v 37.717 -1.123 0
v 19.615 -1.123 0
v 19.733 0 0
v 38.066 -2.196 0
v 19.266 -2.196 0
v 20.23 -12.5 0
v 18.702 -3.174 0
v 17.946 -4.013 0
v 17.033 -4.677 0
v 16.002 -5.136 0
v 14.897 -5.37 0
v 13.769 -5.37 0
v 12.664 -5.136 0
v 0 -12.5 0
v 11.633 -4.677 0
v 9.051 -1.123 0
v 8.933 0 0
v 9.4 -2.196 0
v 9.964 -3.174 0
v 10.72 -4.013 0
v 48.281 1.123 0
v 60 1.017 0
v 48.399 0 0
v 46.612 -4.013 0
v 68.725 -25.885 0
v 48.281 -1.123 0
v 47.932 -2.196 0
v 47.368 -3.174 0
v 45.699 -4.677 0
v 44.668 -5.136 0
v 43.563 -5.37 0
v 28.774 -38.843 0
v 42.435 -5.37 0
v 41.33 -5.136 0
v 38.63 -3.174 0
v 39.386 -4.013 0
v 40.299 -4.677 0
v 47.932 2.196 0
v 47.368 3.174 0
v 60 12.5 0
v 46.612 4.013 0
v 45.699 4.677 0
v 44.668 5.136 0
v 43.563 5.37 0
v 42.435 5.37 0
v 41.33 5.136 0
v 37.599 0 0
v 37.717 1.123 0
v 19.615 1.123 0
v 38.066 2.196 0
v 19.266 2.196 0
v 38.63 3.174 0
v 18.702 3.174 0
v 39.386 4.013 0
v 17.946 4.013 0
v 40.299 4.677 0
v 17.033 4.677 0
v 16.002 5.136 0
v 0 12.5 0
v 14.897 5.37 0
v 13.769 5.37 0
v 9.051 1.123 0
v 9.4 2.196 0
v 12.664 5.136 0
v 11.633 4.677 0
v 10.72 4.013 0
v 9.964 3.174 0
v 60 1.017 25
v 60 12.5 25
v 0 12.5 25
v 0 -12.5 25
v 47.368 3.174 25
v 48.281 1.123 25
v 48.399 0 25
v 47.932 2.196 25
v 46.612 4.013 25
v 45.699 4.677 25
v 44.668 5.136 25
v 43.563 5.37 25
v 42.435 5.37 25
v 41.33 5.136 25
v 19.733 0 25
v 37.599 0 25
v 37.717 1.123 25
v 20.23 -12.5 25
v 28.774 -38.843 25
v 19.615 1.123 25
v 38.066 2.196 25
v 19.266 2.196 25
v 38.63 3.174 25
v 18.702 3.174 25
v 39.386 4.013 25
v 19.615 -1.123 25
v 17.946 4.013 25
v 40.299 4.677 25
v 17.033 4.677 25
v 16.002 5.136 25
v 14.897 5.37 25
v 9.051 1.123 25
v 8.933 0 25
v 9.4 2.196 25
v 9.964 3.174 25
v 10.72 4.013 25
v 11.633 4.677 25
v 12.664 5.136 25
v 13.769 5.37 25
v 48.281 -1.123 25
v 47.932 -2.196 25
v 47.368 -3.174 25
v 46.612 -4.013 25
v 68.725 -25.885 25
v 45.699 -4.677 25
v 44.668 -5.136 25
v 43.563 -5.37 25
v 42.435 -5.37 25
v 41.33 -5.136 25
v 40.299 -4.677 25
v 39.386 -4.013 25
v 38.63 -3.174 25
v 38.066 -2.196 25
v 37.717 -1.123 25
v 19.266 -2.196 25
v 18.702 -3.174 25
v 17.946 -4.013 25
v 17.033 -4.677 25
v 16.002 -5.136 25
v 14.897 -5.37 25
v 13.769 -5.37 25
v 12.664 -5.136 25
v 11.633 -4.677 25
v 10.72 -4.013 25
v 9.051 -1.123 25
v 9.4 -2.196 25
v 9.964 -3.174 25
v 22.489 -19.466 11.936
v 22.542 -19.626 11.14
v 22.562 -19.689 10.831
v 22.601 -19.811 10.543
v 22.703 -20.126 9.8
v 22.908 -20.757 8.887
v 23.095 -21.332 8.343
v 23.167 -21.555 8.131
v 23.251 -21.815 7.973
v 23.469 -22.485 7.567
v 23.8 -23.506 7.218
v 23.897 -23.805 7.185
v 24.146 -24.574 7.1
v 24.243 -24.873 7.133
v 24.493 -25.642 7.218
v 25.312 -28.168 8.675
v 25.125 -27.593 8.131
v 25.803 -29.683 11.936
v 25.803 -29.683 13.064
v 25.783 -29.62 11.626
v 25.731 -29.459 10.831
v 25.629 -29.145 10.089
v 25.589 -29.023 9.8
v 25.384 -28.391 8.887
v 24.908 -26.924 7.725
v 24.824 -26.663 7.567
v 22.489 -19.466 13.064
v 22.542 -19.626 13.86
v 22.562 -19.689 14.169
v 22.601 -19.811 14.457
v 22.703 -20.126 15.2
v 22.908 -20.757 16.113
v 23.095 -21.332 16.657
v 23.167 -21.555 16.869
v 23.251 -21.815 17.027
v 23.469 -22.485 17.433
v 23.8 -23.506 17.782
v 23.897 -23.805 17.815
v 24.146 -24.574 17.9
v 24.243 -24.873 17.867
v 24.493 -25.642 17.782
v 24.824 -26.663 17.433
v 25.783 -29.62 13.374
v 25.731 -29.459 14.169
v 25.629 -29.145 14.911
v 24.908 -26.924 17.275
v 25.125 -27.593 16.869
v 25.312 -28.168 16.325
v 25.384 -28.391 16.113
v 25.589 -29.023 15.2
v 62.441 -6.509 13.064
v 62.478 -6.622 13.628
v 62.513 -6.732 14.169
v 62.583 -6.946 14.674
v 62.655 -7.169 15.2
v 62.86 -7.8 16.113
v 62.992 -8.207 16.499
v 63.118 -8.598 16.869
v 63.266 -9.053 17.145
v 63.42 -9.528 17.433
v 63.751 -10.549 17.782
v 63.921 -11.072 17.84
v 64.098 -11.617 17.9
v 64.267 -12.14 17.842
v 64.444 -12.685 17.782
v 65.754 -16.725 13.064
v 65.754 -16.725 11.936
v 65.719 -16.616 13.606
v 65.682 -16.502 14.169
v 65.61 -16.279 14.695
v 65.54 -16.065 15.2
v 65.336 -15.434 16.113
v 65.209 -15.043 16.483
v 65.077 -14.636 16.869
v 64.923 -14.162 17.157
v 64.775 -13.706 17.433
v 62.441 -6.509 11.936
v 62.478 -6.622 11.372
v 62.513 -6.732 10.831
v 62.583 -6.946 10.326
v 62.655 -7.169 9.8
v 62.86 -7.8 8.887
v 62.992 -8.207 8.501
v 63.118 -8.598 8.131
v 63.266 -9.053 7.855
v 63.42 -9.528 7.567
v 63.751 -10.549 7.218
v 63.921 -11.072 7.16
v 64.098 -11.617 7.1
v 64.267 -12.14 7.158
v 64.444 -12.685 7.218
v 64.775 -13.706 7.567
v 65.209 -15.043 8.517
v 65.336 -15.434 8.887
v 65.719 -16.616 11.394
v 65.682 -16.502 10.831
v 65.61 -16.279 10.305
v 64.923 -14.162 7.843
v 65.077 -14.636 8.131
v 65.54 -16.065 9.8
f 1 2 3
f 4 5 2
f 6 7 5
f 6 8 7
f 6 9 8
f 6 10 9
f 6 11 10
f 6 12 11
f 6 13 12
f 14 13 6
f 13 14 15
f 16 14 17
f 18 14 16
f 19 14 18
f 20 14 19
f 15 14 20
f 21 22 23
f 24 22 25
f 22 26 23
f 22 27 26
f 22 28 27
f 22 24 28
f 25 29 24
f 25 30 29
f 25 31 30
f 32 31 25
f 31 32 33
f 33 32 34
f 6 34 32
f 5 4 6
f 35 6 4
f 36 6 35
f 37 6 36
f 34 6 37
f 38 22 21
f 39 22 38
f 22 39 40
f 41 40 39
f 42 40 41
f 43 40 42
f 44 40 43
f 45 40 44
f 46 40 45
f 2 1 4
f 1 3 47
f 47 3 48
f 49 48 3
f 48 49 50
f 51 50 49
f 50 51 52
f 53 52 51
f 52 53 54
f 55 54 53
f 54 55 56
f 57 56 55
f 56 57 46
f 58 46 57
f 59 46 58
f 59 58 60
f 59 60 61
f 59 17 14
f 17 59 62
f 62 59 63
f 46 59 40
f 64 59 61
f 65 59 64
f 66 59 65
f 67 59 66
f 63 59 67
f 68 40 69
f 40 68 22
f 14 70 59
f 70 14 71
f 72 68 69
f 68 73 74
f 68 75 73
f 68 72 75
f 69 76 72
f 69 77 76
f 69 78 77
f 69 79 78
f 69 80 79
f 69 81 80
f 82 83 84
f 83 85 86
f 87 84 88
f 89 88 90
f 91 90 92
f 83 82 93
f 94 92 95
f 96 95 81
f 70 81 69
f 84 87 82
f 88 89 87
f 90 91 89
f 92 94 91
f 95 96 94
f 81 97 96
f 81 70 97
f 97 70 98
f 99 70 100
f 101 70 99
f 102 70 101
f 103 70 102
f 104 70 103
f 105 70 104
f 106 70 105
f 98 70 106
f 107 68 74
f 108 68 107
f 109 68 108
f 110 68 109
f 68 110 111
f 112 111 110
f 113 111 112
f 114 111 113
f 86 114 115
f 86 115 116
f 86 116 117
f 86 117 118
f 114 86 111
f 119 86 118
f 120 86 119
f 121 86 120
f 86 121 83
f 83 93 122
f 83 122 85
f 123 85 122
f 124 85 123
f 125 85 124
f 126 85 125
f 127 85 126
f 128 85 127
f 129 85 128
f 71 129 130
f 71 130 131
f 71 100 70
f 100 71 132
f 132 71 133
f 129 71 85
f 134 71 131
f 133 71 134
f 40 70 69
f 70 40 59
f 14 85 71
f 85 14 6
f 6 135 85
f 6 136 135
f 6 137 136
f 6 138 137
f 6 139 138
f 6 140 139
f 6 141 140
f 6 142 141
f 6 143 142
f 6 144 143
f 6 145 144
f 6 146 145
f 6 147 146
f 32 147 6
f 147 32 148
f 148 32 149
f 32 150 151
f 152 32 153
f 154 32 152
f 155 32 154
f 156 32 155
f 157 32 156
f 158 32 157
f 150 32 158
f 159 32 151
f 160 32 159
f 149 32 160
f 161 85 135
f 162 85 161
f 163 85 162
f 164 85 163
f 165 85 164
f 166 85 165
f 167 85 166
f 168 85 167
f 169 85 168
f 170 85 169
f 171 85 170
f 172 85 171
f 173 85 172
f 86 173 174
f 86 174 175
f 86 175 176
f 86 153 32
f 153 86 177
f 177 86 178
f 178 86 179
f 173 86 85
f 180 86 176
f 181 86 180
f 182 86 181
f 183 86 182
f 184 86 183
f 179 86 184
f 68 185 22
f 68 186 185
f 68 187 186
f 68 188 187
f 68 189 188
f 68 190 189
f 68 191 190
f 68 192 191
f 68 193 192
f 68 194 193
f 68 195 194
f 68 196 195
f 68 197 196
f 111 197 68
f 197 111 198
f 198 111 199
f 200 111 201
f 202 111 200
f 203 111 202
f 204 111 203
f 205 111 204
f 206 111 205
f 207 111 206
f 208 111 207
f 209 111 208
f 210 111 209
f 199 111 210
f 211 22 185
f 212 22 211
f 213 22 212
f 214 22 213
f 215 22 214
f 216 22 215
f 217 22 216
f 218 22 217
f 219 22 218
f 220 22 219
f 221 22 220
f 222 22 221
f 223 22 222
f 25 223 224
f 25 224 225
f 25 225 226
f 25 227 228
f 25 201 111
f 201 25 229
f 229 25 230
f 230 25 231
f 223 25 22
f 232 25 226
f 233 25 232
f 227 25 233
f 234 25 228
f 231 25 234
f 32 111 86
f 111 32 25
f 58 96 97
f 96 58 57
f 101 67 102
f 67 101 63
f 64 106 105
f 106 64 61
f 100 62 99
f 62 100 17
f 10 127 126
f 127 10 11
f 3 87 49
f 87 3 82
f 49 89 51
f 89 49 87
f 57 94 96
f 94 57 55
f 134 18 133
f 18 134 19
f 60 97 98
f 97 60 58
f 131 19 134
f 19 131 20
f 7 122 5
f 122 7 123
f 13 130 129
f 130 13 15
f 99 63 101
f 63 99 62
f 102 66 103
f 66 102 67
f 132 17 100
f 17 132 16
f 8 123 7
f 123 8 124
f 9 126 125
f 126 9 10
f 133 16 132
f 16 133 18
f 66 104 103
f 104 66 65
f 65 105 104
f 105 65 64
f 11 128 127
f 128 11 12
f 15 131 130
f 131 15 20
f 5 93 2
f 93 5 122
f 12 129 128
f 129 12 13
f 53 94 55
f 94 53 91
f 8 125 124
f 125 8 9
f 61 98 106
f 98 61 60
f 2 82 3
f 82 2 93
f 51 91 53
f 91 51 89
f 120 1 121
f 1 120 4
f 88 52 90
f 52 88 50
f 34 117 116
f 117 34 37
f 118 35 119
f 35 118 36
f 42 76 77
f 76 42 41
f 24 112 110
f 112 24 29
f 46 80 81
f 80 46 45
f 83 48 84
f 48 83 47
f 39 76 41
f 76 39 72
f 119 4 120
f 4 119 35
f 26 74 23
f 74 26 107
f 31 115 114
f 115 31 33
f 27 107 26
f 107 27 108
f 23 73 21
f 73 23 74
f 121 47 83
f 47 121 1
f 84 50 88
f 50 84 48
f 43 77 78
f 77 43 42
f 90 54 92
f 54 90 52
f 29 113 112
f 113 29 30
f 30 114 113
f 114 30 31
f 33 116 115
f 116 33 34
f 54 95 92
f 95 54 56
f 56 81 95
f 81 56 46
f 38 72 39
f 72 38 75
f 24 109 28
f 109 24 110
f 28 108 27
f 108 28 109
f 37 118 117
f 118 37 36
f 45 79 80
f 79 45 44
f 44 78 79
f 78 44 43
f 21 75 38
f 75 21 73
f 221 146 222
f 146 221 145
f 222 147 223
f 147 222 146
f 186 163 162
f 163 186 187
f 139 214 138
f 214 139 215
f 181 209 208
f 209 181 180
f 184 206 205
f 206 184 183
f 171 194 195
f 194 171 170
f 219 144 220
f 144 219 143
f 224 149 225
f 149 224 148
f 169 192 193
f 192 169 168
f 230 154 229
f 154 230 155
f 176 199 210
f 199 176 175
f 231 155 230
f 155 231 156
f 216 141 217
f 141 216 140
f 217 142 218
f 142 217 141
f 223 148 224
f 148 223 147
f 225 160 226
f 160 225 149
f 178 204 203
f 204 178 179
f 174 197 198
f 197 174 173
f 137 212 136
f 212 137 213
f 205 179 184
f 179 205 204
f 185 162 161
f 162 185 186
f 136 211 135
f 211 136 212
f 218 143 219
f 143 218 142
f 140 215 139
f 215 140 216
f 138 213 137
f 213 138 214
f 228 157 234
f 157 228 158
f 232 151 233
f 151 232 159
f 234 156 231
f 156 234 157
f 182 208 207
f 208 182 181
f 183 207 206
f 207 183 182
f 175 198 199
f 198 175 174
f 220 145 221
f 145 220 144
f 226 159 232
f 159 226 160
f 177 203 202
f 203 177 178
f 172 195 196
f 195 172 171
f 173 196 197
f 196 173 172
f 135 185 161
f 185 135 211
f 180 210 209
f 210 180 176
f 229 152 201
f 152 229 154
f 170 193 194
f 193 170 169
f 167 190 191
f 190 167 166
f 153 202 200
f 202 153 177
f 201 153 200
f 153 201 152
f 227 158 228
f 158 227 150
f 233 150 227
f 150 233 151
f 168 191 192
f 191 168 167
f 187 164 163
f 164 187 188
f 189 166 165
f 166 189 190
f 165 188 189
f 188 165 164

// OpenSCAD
eps = 0.01;

height = 60;
width = 25;
depth = 25;
depth2 = 30;

r_hole = 5.4;

hole_distance = 14.333;


brace_hole_length = 200; // size not important, as long as big enough
brace_hole_length2 = 42;
brace_hole_xpos = 23;
brace_hole_ypos = -11;
brace_hole_height = 1.1*height;

angle = atan(370/120)-90; 


module corner_base(){
	translate([-width/2,-depth/2,0]) cube([width,depth,height]);
	translate([0,brace_hole_ypos,brace_hole_height]) rotate([angle,0,0]) translate([-width/2,-depth2/2,-brace_hole_length2/2-brace_hole_xpos]) cube([width,depth2,brace_hole_length2]);
}

module corner_holes(){
	translate([0,-depth/2,0]){
  		// Bottom hole
		translate([0,depth/2,hole_distance]) rotate([0,90,0]) translate([0,0,-width/2-eps]) cylinder(h = width+2*eps, r=r_hole, $fn=30);
		// Top hole
		translate([0,depth/2,3*hole_distance]) rotate([0,90,0]) translate([0,0,-width/2-eps]) cylinder(h = width+2*eps, r=r_hole, $fn=30);
 	}
	// Brace hole
	translate([0,brace_hole_ypos,brace_hole_height]) rotate([angle,0,0]) translate([0,0,-brace_hole_length/2]) cylinder(h = brace_hole_length, r=r_hole, $fn=30);
}


// Final part
module corner(){
	difference() {
		corner_base();
		corner_holes();
	}
}

echo("hole_distance=", hole_distance);
echo("angle=", angle);

translate([0,0,width/2]) rotate([0,90,0]) corner();
